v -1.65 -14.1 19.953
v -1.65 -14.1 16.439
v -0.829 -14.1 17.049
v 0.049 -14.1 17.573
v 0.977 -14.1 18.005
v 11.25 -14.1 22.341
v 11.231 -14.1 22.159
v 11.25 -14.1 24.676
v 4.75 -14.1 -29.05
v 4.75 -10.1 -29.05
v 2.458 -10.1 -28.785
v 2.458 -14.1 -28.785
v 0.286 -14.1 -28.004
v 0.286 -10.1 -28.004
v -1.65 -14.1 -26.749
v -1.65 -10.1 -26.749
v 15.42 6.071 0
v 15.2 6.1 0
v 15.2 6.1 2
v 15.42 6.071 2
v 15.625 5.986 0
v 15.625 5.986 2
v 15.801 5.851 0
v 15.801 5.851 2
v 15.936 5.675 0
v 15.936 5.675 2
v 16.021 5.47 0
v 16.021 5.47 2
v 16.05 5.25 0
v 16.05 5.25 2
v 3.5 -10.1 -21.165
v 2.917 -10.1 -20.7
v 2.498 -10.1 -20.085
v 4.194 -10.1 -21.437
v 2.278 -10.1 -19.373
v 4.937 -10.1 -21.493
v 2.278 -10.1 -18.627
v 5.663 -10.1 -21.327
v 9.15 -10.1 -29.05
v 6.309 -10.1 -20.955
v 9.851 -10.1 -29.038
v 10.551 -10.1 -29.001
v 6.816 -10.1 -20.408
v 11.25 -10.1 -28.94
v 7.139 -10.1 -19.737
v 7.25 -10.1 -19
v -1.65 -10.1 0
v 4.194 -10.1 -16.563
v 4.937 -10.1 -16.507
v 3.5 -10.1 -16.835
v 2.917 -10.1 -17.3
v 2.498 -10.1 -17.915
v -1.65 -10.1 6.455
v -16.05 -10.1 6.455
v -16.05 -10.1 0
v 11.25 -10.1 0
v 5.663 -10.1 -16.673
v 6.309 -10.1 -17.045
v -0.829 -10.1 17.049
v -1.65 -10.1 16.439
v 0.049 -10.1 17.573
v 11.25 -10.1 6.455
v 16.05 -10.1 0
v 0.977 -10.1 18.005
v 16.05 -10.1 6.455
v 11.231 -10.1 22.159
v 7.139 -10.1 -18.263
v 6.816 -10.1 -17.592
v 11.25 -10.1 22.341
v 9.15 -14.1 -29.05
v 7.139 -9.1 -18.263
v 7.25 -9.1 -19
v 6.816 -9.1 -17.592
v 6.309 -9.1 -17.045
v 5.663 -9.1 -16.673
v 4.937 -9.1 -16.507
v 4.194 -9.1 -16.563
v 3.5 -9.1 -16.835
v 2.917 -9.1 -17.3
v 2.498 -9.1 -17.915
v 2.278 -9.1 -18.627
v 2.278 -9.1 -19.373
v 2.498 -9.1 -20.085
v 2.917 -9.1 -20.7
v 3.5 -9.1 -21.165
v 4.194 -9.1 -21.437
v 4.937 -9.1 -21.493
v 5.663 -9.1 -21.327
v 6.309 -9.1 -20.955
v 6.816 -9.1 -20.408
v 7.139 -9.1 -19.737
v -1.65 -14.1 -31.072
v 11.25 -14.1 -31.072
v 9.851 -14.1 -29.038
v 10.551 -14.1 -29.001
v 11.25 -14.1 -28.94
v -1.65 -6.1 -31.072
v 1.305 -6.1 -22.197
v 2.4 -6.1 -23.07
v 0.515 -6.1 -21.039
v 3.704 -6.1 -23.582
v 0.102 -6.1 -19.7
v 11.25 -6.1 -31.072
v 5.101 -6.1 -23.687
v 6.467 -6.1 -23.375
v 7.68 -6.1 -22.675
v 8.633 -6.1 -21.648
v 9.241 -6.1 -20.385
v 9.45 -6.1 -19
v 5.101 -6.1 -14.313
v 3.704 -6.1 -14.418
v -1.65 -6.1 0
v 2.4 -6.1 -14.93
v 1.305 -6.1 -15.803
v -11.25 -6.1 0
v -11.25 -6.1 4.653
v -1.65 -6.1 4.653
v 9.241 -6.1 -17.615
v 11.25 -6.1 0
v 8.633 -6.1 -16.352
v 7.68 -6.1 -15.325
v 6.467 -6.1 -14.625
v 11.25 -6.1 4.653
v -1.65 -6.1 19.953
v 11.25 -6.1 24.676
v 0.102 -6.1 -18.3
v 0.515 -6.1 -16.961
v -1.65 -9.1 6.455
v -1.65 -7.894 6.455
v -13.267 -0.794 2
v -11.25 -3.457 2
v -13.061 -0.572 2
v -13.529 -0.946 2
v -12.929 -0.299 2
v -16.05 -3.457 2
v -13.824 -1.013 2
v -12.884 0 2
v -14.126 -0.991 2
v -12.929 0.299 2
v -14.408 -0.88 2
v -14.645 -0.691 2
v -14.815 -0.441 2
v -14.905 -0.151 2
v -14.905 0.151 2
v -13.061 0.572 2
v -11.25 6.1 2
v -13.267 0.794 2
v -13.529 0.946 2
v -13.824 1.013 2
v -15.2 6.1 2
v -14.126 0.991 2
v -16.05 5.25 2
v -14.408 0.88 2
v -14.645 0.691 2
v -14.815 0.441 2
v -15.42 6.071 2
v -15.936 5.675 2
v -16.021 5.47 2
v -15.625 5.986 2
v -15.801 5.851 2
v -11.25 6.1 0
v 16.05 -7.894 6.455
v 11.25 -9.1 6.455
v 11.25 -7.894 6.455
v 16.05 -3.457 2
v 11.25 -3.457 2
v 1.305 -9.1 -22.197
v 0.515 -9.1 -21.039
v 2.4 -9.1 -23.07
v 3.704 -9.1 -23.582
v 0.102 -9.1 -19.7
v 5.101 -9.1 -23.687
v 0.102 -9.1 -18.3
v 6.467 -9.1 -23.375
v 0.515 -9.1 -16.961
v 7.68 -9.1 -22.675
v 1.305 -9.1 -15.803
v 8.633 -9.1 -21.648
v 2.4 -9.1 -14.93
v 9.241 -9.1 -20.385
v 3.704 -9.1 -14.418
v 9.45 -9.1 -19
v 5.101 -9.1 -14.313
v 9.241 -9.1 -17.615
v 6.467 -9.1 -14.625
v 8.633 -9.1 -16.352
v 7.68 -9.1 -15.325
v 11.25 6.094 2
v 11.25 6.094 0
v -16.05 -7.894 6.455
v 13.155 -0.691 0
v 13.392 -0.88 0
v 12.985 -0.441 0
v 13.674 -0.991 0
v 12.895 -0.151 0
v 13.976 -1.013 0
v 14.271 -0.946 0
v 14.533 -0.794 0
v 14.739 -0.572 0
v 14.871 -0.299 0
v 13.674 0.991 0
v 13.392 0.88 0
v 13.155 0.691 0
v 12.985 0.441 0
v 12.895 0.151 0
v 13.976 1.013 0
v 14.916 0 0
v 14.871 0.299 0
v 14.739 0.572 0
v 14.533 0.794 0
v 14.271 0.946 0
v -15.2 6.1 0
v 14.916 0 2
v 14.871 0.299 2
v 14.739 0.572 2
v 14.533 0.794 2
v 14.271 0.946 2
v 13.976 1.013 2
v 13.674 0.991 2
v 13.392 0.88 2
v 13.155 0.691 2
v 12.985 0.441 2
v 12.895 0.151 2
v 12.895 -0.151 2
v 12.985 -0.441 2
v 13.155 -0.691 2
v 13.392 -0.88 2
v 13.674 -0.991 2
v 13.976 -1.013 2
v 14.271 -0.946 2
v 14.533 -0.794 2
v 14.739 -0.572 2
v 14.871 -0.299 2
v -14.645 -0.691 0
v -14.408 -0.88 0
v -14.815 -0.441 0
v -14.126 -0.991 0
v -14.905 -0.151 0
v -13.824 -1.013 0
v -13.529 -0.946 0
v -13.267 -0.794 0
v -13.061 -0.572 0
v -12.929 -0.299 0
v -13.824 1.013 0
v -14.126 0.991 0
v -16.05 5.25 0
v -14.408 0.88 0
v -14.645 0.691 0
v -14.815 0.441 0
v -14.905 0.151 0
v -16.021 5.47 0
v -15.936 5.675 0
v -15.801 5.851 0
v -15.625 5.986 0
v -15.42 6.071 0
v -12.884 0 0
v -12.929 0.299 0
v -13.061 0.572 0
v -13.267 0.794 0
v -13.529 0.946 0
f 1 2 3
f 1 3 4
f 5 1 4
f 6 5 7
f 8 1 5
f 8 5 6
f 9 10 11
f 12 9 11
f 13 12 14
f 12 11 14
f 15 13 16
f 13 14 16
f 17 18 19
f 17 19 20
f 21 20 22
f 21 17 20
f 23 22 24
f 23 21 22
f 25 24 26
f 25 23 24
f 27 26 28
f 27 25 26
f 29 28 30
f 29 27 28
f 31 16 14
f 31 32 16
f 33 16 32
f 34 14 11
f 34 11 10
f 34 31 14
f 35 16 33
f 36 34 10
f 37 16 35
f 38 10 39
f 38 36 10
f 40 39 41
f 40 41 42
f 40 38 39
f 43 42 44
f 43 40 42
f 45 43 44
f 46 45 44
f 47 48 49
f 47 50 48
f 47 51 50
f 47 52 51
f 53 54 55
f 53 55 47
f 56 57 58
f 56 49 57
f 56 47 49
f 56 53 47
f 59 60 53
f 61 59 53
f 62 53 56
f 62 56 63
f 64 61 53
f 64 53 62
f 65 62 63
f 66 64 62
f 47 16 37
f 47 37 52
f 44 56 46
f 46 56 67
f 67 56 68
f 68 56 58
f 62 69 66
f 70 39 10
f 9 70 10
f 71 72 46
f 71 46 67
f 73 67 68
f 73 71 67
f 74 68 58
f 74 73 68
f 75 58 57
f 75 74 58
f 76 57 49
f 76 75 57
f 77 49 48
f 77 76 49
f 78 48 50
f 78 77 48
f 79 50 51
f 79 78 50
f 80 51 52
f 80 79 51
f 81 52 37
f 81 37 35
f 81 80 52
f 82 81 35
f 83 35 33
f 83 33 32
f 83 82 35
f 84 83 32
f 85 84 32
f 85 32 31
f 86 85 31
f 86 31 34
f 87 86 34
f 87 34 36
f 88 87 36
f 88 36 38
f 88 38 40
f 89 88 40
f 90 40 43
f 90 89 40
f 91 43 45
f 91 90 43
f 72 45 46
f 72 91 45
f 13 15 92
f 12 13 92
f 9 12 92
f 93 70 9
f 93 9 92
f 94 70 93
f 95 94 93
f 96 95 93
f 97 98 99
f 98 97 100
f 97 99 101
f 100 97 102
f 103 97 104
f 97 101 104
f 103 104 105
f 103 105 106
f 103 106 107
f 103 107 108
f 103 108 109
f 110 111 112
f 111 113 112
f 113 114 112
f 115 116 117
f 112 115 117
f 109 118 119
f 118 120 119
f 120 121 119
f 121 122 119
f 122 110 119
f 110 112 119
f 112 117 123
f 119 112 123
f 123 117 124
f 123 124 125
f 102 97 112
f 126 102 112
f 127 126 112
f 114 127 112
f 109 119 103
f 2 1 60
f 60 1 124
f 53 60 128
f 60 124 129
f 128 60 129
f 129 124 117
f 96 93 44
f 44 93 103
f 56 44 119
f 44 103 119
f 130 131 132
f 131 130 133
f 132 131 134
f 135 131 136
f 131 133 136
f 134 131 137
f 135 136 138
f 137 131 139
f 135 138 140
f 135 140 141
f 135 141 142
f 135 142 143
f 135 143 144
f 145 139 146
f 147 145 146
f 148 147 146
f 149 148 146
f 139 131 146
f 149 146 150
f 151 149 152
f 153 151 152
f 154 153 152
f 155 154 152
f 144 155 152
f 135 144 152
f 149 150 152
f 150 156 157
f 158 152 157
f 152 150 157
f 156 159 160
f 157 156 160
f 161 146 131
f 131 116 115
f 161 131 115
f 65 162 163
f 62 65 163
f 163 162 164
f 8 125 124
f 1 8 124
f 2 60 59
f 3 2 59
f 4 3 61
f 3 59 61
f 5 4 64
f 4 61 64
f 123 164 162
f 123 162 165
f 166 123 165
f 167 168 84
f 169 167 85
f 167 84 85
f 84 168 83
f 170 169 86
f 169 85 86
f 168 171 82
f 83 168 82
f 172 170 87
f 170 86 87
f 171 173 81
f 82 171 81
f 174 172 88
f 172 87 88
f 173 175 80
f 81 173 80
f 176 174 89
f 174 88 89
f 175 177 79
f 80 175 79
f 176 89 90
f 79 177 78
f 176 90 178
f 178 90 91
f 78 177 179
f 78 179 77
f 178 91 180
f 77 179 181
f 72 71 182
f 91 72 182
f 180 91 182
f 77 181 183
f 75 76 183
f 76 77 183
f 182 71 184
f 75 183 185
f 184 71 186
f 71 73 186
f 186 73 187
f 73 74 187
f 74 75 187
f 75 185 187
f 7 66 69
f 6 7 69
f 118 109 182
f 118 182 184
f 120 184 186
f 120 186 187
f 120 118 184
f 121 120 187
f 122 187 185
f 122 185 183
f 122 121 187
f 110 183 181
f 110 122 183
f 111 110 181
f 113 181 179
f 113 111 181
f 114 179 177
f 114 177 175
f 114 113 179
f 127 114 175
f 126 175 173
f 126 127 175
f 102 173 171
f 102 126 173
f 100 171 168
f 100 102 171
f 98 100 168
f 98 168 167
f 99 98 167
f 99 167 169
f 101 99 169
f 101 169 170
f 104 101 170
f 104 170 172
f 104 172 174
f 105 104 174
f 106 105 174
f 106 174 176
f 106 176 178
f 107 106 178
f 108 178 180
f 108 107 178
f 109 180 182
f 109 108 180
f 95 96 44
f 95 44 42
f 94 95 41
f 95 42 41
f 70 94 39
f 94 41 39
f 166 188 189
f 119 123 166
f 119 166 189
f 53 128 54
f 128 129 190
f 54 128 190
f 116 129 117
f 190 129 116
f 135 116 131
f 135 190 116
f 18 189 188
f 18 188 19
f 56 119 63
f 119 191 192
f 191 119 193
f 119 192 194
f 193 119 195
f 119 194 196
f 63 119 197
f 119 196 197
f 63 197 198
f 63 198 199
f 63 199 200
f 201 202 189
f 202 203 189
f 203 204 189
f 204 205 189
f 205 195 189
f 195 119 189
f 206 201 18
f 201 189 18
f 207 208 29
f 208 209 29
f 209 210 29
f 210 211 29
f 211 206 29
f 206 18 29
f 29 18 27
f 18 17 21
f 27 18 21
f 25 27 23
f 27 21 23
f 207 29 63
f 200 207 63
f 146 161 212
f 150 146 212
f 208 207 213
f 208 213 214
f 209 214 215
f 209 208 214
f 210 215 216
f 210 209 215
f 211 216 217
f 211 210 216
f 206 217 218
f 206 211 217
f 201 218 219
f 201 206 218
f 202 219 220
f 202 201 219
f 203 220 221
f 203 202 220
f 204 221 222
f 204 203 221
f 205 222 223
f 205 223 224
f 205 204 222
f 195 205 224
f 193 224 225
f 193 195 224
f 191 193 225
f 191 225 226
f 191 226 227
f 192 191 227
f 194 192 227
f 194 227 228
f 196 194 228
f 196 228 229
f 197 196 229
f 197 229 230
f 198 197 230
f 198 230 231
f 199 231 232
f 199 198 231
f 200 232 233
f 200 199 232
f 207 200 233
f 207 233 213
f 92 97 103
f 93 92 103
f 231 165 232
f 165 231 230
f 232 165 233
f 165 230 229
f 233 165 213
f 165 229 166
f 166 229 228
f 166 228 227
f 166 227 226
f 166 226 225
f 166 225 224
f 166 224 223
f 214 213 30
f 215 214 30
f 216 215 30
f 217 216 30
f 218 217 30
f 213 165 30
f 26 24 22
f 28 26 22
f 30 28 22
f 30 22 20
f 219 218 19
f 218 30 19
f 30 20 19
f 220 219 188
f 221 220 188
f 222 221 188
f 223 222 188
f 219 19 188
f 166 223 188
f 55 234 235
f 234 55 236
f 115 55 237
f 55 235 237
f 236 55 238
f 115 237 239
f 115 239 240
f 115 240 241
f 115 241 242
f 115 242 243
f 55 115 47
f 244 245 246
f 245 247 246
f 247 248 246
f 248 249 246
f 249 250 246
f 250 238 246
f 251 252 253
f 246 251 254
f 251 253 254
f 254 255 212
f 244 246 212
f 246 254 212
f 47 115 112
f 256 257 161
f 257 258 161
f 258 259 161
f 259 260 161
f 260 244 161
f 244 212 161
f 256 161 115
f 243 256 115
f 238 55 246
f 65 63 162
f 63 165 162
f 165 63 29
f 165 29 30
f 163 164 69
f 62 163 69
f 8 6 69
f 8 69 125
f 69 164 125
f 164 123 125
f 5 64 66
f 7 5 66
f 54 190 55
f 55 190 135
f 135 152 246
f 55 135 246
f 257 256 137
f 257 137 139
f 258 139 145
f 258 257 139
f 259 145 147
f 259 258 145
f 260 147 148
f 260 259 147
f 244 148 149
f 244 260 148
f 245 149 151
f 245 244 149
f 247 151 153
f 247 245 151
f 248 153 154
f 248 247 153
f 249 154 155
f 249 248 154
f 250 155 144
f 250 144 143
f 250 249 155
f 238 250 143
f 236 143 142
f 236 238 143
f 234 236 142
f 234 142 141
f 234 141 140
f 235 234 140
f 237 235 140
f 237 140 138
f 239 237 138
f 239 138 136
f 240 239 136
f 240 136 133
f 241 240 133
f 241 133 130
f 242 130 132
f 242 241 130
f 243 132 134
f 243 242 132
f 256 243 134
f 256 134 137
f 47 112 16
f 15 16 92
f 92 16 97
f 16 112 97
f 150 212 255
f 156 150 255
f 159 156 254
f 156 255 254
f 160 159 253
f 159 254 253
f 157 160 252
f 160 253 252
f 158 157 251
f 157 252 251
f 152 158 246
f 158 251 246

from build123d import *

# Parameters (mm, degrees)
SKETCH1_R                       = 1.016
BOSS_EXTRUDE1_DEPTH             = 2
SKETCH2_R                       = 4.7
BOSS_EXTRUDE2_DEPTH             = 3
BOSS_EXTRUDE5_DEPTH             = 8
BOSS_EXTRUDE6_REACH             = 45.699
BOSS_EXTRUDE6_DIRECTION_2_REACH = 45.699
SKETCH4_W                       = 22.5
SKETCH4_H                       = 14.127681706
CUT_EXTRUDE1_DEPTH              = 7
FILLET1_R                       = 0.5
SKETCH5_R                       = 2.5
BOSS_EXTRUDE7_DEPTH             = 1
SKETCH6_W                       = 5.313656685
SKETCH6_H                       = 4.599259183
SKETCH6_W_2                     = 16.163165117
SKETCH6_H_2                     = 5.344557169
CUT_EXTRUDE2_DEPTH              = 5


with BuildPart() as part:
    # Sketch1 → Boss-Extrude1 (new body)
    # profile 1 of 4: a face of its own
    with BuildSketch(Plane.XY):
        with BuildLine():
            Line((-16.05, 5.25), (-16.05, -5.25))
            ThreePointArc((-16.05, -5.25), (-15.801040764, -5.851040764), (-15.2, -6.1))
            Line((-15.2, -6.1), (-11.25, -6.1))
            Line((-11.25, -6.1), (-11.25, 6.1))
            Line((-11.25, 6.1), (-15.2, 6.1))
            ThreePointArc((-15.2, 6.1), (-15.801040764, 5.851040764), (-16.05, 5.25))
        make_face()
        with Locations((-13.9, 0)):
            Circle(SKETCH1_R, mode=Mode.SUBTRACT)
    # profile 2 of 4: a face of its own
    with BuildSketch(Plane.XY):
        with BuildLine():
            Line((16.05, 5.25), (16.05, -5.25))
            ThreePointArc((16.05, -5.25), (15.801040764, -5.851040764), (15.2, -6.1))
            Line((15.2, -6.1), (11.25, -6.1))
            Line((11.25, -6.1), (11.25, 6.094097151))
            Line((11.25, 6.094097151), (15.2, 6.1))
            ThreePointArc((15.2, 6.1), (15.801040764, 5.851040764), (16.05, 5.25))
        make_face()
        with Locations((13.9, 0)):
            Circle(SKETCH1_R, mode=Mode.SUBTRACT)
    # profile 3 of 4: a face of its own
    with BuildSketch(Plane.XY):
        with BuildLine():
            ThreePointArc((15.2, -6.1), (15.801040764, -5.851040764), (16.05, -5.25))
            Line((16.05, -5.25), (16.05, -6.1))
            Line((16.05, -6.1), (15.2, -6.1))
        make_face()
    # profile 4 of 4: a face of its own
    with BuildSketch(Plane.XY):
        with BuildLine():
            ThreePointArc((-16.05, -5.25), (-15.801040764, -5.851040764), (-15.2, -6.1))
            Line((-15.2, -6.1), (-16.05, -6.1))
            Line((-16.05, -6.1), (-16.05, -5.25))
        make_face()
    extrude(amount=BOSS_EXTRUDE1_DEPTH)

    # Sketch2 → Boss-Extrude2 (add)
    with BuildSketch(Plane.XZ.offset(6.1)):
        Polygon((16.05, 2), (11.25, 2), (11.25, 24.675592953), (-1.65, 19.952742461), (-1.65, 2), (-16.05, 2), (-16.05, 0), (-1.65, 0), (-1.65, -31.072136217), (11.25, -31.072136217), (11.25, 0), (16.05, 0), align=None)
        with Locations((4.75, -19)):
            Circle(SKETCH2_R, mode=Mode.SUBTRACT)
    extrude(amount=BOSS_EXTRUDE2_DEPTH)

    # Sketch2<3> → Boss-Extrude5 (add)
    with BuildSketch(Plane.XZ.offset(6.1)):
        with BuildLine():
            Line((11.231228015, 22.158640143), (11.25, 22.341096015))
            Line((11.25, 22.341096015), (11.25, 24.675592953))
            Line((11.25, 24.675592953), (-1.65, 19.952742461))
            Line((-1.65, 19.952742461), (-1.65, 16.43877001))
            ThreePointArc((-1.65, 16.43877001), (-0.396504625, 17.322324926), (0.97683102, 18.004871005))
            Line((0.97683102, 18.004871005), (11.231228015, 22.158640143))
        make_face()
        with BuildLine():
            ThreePointArc((4.75, -29.05), (1.349414108, -28.457193854), (-1.65, -26.74870957))
            Line((-1.65, -26.74870957), (-1.65, -31.072136217))
            Line((-1.65, -31.072136217), (11.25, -31.072136217))
            Line((11.25, -31.072136217), (11.25, -28.939719159))
            ThreePointArc((11.25, -28.939719159), (10.201434939, -29.022410808), (9.149976222, -29.05))
            Line((9.149976222, -29.05), (4.75, -29.05))
        make_face()
    extrude(amount=BOSS_EXTRUDE5_DEPTH)

    # Boss-Extrude6: up to this face of the body (flat: up to its plane)
    boss_extrude6_end = Plane(part.part.faces().sort_by_distance((16.05, -1.925, 1))[0])
    # Sketch3 → Boss-Extrude6 (add, up to the picked face)
    with BuildSketch(Plane(origin=(11.25, 0, 0), x_dir=(0, 0, -1), z_dir=(1, 0, 0)), mode=Mode.PRIVATE) as boss_extrude6_sk1:
        Polygon((-7.665828596, -9.1), (-2, -3.457464127), (-2, -9.1), align=None)
    boss_extrude6_tool1 = split(extrude(boss_extrude6_sk1.sketch, amount=BOSS_EXTRUDE6_REACH, mode=Mode.PRIVATE), bisect_by=boss_extrude6_end, keep=Keep.BOTH, mode=Mode.PRIVATE)
    add(boss_extrude6_tool1.solids().sort_by(Axis((11.25, -7.219155, 3.88861), (1, 0, 0)))[0])

    # Boss-Extrude6 direction 2: up to this face of the body (flat: up to its plane)
    boss_extrude6_direction_2_end = Plane(part.part.faces().sort_by_distance((-16.05, -1.925, 1))[0])
    # Sketch3 → Boss-Extrude6 direction 2 (add, up to the picked face)
    with BuildSketch(Plane(origin=(11.25, 0, 0), x_dir=(0, 0, -1), z_dir=(1, 0, 0)), mode=Mode.PRIVATE) as boss_extrude6_direction_2_sk1:
        Polygon((-7.665828596, -9.1), (-2, -3.457464127), (-2, -9.1), align=None)
    boss_extrude6_direction_2_tool1 = split(extrude(boss_extrude6_direction_2_sk1.sketch, amount=-BOSS_EXTRUDE6_DIRECTION_2_REACH, mode=Mode.PRIVATE), bisect_by=boss_extrude6_direction_2_end, keep=Keep.BOTH, mode=Mode.PRIVATE)
    add(boss_extrude6_direction_2_tool1.solids().sort_by(Axis((11.25, -7.219155, 3.88861), (-1, 0, 0)))[0])

    # Sketch4 → Cut-Extrude1 (cut)
    with BuildSketch(Plane(origin=(0, -6.1, 0), x_dir=(1, 0, 0), z_dir=(0, 1, 0))):
        with Locations((0, -7.063840853)):
            Rectangle(SKETCH4_W, SKETCH4_H)
    extrude(amount=CUT_EXTRUDE1_DEPTH, mode=Mode.SUBTRACT)

    # Fillet1
    fillet1_edges = [part.edges().sort_by_distance(p)[0] for p in [
        (13.65, -9.1, 7.665828596),
        (-8.85, -9.1, 7.665828596),
    ]]
    fillet(fillet1_edges, radius=FILLET1_R)

    # Sketch5 → Boss-Extrude7 (add)
    with BuildSketch(Plane.XZ.offset(9.1)):
        with BuildLine():
            Line((-1.65, 16.43877001), (-1.65, 6.455196792))
            Line((-1.65, 6.455196792), (-16.05, 6.455196792))
            Line((-16.05, 6.455196792), (-16.05, 0))
            Line((-16.05, 0), (-1.65, 0))
            Line((-1.65, 0), (-1.65, -26.74870957))
            ThreePointArc((-1.65, -26.74870957), (1.349414108, -28.457193854), (4.75, -29.05))
            Line((4.75, -29.05), (9.149976222, -29.05))
            ThreePointArc((9.149976222, -29.05), (10.201434939, -29.022410808), (11.25, -28.939719159))
            Line((11.25, -28.939719159), (11.25, 0))
            Line((11.25, 0), (16.05, 0))
            Line((16.05, 0), (16.05, 6.455196792))
            Line((16.05, 6.455196792), (11.25, 6.455196792))
            Line((11.25, 6.455196792), (11.25, 22.341096015))
            Line((11.25, 22.341096015), (11.231228015, 22.158640143))
            Line((11.231228015, 22.158640143), (0.97683102, 18.004871005))
            ThreePointArc((0.97683102, 18.004871005), (-0.396504625, 17.322324926), (-1.65, 16.43877001))
        make_face()
        with Locations((4.75, -19)):
            Circle(SKETCH5_R, mode=Mode.SUBTRACT)
    extrude(amount=BOSS_EXTRUDE7_DEPTH)

    # Sketch6 → Cut-Extrude2 (cut)
    with BuildSketch(Plane.XY.offset(6.455196792)):
        with Locations((13.906828343, -7.800370409)):
            Rectangle(SKETCH6_W, SKETCH6_H)
        with Locations((-9.731582558, -7.427721416)):
            Rectangle(SKETCH6_W_2, SKETCH6_H_2)
    extrude(amount=CUT_EXTRUDE2_DEPTH, mode=Mode.SUBTRACT)


solid = part.part
